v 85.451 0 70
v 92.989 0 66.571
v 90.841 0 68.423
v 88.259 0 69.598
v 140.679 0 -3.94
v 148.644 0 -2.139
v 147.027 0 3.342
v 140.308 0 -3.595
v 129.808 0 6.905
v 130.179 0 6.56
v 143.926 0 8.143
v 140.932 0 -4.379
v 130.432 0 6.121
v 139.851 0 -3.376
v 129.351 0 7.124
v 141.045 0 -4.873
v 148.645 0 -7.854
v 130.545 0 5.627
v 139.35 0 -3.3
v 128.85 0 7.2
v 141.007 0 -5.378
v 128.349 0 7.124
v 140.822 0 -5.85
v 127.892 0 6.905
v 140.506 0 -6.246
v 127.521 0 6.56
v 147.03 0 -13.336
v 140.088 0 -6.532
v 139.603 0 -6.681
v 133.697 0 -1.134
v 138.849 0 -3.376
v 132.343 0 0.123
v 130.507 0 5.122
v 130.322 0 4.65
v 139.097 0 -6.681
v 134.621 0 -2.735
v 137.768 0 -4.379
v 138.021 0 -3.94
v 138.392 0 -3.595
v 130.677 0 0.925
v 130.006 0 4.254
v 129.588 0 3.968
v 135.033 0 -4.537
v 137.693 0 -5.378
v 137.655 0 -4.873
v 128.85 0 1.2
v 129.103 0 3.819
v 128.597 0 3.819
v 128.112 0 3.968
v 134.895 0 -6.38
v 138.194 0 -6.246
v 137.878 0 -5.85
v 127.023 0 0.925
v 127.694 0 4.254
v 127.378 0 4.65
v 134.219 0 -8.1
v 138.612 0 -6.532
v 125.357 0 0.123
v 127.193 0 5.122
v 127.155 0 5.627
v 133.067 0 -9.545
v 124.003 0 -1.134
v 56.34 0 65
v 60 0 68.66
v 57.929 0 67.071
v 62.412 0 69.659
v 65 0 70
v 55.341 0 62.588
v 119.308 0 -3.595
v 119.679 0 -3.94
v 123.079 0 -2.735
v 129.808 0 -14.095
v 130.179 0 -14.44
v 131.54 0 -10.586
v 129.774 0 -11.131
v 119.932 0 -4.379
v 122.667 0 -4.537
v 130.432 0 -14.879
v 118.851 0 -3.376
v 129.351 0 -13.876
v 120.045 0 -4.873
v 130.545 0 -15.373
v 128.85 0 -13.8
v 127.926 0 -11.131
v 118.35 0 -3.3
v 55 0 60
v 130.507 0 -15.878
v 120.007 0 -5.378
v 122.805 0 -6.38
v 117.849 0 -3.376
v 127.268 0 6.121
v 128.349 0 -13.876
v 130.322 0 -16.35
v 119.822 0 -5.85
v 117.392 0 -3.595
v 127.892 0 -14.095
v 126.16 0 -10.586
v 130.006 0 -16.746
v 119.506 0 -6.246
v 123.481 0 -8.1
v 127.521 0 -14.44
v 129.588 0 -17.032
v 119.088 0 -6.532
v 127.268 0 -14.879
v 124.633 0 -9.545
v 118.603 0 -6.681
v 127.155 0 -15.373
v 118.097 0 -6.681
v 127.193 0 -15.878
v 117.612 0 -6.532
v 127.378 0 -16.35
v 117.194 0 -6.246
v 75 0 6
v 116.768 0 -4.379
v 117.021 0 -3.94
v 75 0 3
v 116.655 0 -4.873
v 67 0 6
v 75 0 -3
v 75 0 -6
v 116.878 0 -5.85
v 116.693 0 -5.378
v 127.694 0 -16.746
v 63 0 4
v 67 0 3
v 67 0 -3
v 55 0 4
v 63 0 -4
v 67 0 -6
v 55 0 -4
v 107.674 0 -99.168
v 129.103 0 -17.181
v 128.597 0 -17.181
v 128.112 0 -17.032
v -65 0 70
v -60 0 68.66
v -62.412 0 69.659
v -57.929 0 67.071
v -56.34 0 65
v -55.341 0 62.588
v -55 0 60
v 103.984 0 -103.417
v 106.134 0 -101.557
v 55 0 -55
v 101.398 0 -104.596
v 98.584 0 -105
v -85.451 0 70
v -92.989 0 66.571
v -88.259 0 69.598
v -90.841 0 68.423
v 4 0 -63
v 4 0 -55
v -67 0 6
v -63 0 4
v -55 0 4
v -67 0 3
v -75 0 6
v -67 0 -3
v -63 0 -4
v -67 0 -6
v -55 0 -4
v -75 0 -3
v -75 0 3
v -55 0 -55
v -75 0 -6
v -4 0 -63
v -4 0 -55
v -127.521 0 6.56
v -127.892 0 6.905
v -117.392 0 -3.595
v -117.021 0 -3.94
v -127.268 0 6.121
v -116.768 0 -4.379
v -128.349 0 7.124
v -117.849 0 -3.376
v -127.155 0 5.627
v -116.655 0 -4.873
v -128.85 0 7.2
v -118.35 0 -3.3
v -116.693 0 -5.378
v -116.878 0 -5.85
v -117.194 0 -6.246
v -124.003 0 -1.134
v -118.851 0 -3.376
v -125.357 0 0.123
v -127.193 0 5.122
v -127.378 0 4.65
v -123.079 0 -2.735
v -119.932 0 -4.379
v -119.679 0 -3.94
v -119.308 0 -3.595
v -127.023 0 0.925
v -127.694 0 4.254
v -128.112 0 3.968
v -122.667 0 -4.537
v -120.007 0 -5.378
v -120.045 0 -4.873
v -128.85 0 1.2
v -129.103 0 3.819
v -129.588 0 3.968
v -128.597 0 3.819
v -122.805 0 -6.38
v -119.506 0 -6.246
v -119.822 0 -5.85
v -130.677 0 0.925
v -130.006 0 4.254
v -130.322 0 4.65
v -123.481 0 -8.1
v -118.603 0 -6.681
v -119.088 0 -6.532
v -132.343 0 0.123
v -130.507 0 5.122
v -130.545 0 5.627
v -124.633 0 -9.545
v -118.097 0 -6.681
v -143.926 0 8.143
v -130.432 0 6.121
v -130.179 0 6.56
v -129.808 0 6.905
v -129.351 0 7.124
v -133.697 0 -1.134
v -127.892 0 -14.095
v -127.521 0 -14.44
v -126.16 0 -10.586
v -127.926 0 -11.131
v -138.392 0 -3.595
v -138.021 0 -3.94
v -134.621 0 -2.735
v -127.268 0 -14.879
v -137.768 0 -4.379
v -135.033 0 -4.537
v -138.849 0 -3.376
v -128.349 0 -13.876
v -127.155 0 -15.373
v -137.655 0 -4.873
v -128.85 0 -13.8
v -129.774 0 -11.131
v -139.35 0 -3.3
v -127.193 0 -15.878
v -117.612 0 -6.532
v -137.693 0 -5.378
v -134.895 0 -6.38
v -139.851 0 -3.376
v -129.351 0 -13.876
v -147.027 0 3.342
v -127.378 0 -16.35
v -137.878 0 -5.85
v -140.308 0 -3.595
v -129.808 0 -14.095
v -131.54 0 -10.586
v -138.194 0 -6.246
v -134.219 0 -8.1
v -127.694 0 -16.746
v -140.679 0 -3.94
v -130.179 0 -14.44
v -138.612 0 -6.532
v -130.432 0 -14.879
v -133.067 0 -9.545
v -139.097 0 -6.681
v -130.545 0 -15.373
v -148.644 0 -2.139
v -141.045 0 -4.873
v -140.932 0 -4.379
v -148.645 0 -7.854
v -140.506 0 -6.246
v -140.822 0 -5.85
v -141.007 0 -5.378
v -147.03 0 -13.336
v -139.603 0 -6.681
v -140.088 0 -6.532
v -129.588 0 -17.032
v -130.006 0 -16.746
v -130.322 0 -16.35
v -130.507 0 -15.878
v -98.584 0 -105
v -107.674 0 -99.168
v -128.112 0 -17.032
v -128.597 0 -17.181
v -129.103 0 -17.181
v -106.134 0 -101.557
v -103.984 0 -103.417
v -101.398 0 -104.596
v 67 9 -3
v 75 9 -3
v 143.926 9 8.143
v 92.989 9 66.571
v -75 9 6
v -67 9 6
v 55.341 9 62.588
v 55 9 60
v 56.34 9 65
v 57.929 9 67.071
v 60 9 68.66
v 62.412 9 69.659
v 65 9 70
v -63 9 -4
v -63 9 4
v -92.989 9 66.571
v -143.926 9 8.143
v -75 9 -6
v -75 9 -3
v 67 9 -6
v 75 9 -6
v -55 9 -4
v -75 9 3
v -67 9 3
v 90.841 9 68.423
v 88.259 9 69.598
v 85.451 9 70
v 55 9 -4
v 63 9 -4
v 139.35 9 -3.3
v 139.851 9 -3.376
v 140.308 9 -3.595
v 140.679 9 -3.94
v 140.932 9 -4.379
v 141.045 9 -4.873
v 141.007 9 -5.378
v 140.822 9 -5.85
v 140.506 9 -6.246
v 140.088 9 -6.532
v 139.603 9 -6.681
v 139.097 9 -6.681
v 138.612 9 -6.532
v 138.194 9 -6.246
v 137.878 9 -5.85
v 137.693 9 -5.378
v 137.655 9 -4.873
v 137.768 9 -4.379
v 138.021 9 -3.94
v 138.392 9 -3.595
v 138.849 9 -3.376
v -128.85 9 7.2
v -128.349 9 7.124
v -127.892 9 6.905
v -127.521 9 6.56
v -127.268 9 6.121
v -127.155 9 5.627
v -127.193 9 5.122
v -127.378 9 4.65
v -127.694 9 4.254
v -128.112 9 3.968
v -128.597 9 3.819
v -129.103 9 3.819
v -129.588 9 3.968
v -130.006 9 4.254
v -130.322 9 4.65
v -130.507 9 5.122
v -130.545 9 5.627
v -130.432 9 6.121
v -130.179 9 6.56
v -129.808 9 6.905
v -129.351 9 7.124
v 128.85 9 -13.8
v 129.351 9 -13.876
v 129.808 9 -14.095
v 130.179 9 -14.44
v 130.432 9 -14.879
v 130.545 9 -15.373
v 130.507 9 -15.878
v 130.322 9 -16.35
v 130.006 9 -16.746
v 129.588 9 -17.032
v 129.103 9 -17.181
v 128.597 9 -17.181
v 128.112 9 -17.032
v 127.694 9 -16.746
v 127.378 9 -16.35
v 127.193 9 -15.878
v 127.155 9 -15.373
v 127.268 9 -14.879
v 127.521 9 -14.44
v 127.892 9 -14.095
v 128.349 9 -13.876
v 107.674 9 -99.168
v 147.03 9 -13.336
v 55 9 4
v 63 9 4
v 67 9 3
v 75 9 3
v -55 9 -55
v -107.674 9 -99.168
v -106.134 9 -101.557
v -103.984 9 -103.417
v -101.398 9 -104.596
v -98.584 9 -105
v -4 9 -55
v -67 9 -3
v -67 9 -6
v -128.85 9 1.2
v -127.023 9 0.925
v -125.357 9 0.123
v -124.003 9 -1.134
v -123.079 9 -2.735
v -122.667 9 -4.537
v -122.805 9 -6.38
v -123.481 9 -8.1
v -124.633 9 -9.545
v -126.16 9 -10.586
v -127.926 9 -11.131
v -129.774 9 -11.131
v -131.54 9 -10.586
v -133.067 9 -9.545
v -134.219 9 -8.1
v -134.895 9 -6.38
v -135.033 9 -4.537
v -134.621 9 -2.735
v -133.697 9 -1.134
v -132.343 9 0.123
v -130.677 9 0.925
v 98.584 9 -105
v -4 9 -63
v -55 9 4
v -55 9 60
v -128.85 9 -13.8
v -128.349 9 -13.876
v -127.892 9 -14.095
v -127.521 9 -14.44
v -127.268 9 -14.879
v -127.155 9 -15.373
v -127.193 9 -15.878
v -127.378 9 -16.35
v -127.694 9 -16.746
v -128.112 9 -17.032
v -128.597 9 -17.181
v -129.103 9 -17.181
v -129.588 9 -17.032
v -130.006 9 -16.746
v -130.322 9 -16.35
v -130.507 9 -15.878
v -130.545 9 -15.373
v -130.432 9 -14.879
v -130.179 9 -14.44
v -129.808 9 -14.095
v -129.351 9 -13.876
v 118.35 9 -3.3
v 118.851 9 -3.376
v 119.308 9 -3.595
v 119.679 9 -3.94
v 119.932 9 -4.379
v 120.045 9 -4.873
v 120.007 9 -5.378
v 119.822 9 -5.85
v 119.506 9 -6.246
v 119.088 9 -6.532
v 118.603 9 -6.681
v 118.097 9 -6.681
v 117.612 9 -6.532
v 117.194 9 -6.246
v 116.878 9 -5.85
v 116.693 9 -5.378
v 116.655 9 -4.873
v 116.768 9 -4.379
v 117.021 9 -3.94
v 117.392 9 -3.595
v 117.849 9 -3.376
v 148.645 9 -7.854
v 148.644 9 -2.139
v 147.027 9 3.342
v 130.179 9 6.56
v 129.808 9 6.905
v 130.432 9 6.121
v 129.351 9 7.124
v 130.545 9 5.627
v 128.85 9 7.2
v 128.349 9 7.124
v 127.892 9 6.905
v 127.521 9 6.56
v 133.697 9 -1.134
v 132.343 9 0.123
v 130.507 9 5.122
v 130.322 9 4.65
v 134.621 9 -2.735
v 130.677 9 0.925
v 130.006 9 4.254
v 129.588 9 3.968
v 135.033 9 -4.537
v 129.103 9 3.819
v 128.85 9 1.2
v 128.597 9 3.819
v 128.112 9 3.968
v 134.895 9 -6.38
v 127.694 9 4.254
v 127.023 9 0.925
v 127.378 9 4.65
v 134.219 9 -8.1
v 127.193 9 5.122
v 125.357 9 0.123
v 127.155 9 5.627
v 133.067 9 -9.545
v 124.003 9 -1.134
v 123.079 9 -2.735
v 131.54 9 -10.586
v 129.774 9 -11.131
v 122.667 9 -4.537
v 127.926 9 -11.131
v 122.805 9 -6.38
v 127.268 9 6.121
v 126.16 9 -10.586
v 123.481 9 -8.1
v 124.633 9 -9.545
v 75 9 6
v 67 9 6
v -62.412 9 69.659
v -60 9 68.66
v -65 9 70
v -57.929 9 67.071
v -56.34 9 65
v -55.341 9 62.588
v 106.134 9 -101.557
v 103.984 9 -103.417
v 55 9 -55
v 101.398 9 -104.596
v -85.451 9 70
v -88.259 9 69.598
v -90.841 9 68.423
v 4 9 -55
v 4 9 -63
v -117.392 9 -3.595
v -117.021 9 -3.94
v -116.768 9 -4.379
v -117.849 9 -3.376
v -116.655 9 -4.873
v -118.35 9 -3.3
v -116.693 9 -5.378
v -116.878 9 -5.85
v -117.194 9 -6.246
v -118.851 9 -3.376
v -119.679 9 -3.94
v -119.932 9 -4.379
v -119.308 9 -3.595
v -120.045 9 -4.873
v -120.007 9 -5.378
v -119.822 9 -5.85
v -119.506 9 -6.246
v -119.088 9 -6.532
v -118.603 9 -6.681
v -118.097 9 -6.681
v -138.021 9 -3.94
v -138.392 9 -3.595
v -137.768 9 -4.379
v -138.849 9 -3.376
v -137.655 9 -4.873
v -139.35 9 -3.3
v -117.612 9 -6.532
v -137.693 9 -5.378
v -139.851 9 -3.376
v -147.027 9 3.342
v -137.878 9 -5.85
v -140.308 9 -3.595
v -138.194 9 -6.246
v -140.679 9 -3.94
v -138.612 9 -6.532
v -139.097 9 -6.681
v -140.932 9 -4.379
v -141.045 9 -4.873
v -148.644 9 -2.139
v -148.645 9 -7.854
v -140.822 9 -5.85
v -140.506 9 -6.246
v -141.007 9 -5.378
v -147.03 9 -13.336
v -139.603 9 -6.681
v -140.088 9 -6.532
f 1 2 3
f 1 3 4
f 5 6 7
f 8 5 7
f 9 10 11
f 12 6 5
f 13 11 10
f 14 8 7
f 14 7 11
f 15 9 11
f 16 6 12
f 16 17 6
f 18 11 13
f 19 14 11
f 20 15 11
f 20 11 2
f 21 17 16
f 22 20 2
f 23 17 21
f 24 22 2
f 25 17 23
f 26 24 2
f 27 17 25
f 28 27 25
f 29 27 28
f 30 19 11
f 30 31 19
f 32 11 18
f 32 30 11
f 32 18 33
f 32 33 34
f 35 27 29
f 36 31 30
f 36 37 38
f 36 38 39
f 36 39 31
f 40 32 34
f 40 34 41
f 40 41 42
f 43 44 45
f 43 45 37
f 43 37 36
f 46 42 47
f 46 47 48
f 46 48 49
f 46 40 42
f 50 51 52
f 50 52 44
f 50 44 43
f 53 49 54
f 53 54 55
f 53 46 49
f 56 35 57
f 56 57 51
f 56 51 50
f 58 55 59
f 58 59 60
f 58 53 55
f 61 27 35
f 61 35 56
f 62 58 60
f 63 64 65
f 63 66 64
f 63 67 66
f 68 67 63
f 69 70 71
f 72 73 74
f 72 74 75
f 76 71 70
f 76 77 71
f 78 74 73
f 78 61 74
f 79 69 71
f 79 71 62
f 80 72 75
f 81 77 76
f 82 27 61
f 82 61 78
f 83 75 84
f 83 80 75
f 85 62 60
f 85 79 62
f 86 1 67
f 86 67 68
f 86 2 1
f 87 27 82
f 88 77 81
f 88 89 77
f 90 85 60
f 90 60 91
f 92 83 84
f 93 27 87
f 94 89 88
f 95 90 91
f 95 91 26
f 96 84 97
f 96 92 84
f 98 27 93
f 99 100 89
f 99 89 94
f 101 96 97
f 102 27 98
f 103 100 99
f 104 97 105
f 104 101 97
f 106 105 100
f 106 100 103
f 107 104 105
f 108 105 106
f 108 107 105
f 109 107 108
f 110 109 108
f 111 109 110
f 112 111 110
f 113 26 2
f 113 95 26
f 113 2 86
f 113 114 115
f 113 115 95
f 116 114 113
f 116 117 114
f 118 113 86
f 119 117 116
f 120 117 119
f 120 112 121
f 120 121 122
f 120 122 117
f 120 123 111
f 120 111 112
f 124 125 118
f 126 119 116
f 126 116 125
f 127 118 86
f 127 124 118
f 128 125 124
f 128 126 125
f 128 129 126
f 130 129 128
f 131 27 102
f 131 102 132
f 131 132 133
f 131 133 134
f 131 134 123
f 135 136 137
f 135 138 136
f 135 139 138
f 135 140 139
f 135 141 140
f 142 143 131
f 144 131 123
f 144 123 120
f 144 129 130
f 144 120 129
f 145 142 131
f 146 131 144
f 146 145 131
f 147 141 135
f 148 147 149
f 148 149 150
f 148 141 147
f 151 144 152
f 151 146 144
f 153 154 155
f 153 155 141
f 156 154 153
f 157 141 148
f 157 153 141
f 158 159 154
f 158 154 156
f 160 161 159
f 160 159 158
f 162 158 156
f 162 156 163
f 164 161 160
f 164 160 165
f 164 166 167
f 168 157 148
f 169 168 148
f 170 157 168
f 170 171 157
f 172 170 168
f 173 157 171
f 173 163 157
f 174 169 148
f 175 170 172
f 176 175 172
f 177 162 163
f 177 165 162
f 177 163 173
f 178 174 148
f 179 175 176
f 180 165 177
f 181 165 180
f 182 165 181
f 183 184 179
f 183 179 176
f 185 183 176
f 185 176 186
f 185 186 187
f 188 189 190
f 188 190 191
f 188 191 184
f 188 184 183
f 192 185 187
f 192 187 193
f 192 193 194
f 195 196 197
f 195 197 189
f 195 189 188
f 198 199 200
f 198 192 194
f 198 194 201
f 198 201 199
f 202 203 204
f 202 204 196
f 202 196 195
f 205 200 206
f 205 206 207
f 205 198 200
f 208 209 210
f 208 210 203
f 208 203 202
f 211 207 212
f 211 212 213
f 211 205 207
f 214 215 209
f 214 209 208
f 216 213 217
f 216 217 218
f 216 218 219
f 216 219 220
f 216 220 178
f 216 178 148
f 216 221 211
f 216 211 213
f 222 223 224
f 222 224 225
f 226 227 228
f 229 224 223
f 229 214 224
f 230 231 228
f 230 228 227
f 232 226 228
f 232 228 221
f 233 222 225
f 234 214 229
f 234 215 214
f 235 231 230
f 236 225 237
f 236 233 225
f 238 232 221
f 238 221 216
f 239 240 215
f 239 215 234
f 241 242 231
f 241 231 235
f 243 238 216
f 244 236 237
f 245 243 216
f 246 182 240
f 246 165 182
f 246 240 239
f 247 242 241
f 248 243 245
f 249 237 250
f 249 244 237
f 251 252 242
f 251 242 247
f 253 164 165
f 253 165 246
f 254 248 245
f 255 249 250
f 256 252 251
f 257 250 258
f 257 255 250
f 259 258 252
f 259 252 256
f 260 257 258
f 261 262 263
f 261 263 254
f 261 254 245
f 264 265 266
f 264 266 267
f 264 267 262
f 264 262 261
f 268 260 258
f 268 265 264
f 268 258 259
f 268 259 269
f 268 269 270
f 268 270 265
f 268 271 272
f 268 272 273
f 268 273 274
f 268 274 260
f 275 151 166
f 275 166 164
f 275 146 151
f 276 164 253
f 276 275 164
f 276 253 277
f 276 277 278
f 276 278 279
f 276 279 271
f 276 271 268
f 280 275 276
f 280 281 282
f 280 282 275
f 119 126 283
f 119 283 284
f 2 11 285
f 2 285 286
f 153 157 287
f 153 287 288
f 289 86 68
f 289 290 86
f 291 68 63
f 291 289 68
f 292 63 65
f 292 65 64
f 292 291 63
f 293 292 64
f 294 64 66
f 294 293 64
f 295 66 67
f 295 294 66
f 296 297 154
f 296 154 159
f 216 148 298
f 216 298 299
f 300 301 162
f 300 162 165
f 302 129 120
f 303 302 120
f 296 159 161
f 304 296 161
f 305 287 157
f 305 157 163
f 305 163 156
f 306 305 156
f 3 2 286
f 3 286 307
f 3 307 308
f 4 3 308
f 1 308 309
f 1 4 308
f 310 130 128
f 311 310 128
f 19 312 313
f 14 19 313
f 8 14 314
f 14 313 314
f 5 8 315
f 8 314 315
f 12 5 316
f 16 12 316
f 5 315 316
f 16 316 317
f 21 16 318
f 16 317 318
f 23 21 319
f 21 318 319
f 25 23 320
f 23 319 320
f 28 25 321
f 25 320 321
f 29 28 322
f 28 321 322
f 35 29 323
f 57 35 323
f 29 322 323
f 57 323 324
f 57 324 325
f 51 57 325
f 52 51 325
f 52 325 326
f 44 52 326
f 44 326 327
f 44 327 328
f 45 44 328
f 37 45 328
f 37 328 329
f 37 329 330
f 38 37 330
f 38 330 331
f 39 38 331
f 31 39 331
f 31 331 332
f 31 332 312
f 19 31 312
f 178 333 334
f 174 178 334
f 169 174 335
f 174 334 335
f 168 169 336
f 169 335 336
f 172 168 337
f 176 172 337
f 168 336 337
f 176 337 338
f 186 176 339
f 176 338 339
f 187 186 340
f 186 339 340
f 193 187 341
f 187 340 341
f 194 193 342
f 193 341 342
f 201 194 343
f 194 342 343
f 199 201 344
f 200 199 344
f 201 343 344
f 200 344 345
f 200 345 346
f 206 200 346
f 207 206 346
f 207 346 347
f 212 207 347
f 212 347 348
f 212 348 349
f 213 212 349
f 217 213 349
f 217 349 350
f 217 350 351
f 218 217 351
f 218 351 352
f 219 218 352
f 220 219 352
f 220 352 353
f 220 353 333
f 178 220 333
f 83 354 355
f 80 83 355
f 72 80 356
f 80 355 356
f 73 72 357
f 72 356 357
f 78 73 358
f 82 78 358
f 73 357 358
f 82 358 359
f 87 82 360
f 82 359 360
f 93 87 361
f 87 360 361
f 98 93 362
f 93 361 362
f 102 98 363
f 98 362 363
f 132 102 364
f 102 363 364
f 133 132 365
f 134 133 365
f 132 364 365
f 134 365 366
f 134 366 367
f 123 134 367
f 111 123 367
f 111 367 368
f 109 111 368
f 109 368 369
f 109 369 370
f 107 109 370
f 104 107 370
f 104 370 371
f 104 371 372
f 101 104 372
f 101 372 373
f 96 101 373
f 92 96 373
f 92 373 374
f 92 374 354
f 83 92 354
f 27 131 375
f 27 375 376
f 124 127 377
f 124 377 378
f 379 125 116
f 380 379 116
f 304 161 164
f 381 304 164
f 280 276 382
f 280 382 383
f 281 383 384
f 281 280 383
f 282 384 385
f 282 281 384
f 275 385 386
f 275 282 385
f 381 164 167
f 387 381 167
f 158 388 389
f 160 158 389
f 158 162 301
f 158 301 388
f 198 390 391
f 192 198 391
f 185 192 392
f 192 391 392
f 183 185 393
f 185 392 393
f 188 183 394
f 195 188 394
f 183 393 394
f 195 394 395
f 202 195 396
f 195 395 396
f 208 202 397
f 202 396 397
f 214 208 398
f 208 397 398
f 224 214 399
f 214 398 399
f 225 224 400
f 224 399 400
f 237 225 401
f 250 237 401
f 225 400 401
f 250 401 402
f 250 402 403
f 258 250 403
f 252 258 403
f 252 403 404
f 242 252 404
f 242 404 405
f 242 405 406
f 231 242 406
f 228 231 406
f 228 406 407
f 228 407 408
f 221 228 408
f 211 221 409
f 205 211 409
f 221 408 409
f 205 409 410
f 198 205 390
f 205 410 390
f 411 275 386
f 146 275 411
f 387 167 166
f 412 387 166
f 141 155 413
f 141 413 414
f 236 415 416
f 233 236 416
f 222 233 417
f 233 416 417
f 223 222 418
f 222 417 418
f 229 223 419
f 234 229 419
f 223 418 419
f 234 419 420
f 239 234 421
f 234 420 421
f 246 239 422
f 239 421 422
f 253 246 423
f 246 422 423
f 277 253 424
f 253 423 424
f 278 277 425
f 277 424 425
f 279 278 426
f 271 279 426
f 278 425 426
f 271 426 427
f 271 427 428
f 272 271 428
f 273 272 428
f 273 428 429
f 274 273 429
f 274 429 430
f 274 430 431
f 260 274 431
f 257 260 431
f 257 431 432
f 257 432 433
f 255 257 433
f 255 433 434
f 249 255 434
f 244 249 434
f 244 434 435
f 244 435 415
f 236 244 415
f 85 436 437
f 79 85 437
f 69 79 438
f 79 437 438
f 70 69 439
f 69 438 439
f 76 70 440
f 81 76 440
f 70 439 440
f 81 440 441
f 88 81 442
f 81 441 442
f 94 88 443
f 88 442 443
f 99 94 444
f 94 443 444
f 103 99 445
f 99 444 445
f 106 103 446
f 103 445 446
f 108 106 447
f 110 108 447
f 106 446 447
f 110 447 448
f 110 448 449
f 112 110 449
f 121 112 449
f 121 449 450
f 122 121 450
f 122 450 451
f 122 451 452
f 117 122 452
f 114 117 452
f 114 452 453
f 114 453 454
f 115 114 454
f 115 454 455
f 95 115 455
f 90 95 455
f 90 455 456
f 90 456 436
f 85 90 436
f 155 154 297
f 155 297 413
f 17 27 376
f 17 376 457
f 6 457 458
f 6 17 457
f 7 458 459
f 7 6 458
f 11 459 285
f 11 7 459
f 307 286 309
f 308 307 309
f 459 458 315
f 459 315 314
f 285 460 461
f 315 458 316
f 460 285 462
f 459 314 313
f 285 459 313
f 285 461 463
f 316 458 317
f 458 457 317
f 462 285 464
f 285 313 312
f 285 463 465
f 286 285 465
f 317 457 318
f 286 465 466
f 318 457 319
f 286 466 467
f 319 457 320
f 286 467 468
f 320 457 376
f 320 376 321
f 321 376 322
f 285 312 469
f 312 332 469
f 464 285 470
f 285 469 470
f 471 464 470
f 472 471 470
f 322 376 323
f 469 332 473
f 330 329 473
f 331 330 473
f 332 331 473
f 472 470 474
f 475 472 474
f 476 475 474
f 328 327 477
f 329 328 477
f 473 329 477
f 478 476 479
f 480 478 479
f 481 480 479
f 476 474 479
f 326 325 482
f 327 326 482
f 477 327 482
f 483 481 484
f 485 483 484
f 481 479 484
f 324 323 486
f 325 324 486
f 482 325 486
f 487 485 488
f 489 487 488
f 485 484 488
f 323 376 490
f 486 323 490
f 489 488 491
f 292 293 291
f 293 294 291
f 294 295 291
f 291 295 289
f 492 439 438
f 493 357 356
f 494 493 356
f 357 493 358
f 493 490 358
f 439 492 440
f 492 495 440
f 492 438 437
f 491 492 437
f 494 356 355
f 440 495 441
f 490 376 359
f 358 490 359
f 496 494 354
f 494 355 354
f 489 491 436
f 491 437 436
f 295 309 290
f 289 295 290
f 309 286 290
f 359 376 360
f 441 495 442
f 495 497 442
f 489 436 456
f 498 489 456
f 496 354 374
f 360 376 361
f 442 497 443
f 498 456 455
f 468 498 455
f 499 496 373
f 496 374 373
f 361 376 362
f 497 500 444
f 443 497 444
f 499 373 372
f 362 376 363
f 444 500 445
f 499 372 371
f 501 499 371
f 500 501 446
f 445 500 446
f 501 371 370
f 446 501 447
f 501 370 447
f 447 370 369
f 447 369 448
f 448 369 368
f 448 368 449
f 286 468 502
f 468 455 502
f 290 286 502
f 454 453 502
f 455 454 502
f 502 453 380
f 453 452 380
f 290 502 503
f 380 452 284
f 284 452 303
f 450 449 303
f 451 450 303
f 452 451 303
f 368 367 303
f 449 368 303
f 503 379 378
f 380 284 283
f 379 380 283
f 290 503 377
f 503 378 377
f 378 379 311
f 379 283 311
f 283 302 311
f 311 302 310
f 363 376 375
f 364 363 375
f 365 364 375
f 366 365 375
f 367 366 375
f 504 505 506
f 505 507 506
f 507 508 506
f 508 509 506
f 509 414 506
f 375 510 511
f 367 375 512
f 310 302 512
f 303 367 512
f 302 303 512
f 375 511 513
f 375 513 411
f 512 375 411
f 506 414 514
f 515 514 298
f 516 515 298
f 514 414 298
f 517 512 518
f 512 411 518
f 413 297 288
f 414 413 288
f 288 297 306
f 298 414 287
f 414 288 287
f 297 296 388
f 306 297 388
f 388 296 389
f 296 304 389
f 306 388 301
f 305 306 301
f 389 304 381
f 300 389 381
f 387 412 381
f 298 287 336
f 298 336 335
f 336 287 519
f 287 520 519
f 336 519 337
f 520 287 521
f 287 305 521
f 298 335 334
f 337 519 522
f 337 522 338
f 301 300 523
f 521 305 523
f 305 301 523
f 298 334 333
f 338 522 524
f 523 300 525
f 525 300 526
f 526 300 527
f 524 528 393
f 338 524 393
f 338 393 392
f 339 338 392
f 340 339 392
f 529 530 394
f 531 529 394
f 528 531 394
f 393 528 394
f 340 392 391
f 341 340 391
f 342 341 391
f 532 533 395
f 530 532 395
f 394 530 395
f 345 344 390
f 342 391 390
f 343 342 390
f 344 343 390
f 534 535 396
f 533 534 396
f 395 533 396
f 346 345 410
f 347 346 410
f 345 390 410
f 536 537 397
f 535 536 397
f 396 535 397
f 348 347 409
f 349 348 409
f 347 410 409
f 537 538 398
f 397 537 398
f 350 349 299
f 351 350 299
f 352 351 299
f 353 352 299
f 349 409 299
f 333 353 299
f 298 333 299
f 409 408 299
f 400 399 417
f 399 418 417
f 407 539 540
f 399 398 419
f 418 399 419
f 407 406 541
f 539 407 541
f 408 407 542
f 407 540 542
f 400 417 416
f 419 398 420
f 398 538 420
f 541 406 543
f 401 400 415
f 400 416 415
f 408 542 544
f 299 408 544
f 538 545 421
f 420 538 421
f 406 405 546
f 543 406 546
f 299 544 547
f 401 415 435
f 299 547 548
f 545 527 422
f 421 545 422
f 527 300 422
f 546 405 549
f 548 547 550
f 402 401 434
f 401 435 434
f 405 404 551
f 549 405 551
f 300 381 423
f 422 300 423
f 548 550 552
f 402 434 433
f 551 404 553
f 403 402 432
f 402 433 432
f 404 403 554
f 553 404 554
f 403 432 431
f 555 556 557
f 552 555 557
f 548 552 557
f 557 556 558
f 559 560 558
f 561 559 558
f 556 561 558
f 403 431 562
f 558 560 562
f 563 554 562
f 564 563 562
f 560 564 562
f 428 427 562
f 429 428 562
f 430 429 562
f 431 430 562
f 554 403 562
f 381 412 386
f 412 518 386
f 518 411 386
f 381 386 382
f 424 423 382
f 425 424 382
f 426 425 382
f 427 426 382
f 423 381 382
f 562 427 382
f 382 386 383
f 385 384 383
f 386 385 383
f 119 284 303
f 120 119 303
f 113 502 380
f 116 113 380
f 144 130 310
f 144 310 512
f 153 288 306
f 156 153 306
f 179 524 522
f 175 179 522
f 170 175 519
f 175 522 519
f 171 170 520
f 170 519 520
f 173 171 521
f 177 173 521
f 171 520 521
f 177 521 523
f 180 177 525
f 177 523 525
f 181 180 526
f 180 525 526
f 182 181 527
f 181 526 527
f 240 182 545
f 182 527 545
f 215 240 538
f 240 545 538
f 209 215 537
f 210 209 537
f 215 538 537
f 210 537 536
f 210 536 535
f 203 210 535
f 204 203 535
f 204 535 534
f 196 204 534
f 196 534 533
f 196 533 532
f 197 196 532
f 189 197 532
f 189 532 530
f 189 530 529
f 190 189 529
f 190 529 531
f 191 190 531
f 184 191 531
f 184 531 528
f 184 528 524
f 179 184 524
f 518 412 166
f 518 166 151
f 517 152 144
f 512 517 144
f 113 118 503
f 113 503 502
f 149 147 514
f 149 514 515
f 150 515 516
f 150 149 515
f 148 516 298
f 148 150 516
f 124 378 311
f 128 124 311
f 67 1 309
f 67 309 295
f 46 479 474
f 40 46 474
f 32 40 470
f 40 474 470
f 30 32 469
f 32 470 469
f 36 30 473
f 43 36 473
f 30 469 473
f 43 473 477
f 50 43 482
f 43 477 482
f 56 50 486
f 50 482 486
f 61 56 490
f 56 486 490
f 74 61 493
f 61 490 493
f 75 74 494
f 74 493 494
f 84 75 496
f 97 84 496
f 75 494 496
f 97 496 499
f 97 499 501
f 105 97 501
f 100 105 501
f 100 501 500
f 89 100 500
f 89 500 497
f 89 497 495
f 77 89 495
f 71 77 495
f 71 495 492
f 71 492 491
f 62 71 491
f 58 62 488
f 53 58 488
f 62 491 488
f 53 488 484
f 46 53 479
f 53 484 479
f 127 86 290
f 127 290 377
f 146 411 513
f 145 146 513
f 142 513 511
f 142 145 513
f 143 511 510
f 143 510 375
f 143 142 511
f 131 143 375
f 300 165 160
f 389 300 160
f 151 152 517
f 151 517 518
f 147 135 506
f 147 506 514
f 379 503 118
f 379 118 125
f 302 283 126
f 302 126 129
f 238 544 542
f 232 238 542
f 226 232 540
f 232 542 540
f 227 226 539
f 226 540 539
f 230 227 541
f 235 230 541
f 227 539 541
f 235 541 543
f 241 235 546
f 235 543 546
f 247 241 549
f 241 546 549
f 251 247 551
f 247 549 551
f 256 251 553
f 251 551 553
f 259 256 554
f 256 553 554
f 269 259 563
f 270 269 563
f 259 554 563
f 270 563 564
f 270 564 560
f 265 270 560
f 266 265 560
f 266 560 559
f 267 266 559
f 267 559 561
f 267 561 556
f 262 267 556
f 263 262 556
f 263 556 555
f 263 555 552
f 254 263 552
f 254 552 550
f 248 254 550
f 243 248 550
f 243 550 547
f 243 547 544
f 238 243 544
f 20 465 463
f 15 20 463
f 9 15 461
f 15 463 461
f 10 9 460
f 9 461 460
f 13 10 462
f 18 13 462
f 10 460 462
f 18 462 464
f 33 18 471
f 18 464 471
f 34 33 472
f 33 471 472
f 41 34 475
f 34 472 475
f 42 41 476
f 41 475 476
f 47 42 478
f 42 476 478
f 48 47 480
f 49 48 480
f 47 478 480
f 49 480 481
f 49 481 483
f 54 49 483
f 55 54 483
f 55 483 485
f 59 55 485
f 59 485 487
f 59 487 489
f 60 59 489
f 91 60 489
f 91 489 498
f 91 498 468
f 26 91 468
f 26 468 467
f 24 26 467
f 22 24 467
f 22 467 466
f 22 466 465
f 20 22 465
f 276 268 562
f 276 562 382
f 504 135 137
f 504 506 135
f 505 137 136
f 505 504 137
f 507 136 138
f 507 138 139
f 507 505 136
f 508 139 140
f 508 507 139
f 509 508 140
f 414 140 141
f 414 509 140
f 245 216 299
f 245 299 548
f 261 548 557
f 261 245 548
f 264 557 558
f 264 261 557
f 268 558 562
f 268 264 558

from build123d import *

# Parameters (mm, degrees)
SKETCH_1_W          = 110
SKETCH_1_H          = 110
EXTRUDE_1_DEPTH     = 9
SKETCH_2_R          = 6.2
CUT_EXTRUDE_1_DEPTH = 9
SKETCH_10_W         = 8
SKETCH_10_H         = 8
CUT_EXTRUDE_3_DEPTH = 10
SKETCH_9_W          = 110
SKETCH_9_H          = 15
CUT_EXTRUDE_4_DEPTH = 10
FILLET_1_R          = 10
SKETCH_11_W         = 8
SKETCH_11_H         = 3
CUT_EXTRUDE_5_DEPTH = 10
SKETCH_12_R         = 1.7
CUT_EXTRUDE_6_DEPTH = 10


with BuildPart() as part:
    # 草图1 → 凸台-拉伸1 (new body)
    with BuildSketch(Plane(origin=(0, 0, 0), x_dir=(1, 0, 0), z_dir=(0, 1, 0))):
        with BuildLine():
            Line((-98.584118364, 105), (98.584118364, 105))
            ThreePointArc((98.584118364, 105), (103.984134744, 103.416639656), (107.674116766, 99.167964619))
            Line((107.674116766, 99.167964619), (147.029996803, 13.335929237))
            ThreePointArc((147.029996803, 13.335929237), (148.644315385, 2.139042389), (143.925625878, -8.142507538))
            Line((143.925625878, -8.142507538), (92.989084735, -66.571253769))
            ThreePointArc((92.989084735, -66.571253769), (89.591770698, -69.102541889), (85.451271796, -70))
            Line((85.451271796, -70), (50, -70))
            Line((50, -70), (-55, -70))
            Line((-55, -70), (-85.451271796, -70))
            ThreePointArc((-85.451271796, -70), (-89.591770698, -69.102541889), (-92.989084735, -66.571253769))
            Line((-92.989084735, -66.571253769), (-143.925625878, -8.142507538))
            ThreePointArc((-143.925625878, -8.142507538), (-148.644315385, 2.139042389), (-147.029996803, 13.335929237))
            Line((-147.029996803, 13.335929237), (-107.674116766, 99.167964619))
            ThreePointArc((-107.674116766, 99.167964619), (-103.984134744, 103.416639656), (-98.584118364, 105))
        make_face()
        Rectangle(SKETCH_1_W, SKETCH_1_H, mode=Mode.SUBTRACT)
    extrude(amount=EXTRUDE_1_DEPTH)

    # 草图2 → 切除-拉伸1 (cut)
    with BuildSketch(Plane(origin=(0, 9, 0), x_dir=(1, 0, 0), z_dir=(0, 1, 0))):
        with Locations(Location((-128.85, 5, 0), (0, 0, 270))):
            Circle(SKETCH_2_R)
        with Locations(Location((128.85, 5, 0), (0, 0, 270))):
            Circle(SKETCH_2_R)
    extrude(amount=-CUT_EXTRUDE_1_DEPTH, mode=Mode.SUBTRACT)

    # 草图10 → 切除-拉伸3 (cut)
    with BuildSketch(Plane(origin=(0, 9, 0), x_dir=(1, 0, 0), z_dir=(0, 1, 0))):
        with Locations((-59, 0)):
            Rectangle(SKETCH_10_W, SKETCH_10_H)
        with Locations((0, 59)):
            Rectangle(SKETCH_10_W, SKETCH_10_H)
        with Locations((59, 0)):
            Rectangle(SKETCH_10_W, SKETCH_10_H)
        with Locations((0, -59)):
            Rectangle(SKETCH_10_W, SKETCH_10_H)
    extrude(amount=-CUT_EXTRUDE_3_DEPTH, mode=Mode.SUBTRACT)

    # 草图9 → 切除-拉伸4 (cut)
    with BuildSketch(Plane.XZ):
        with Locations((0, 62.5)):
            Rectangle(SKETCH_9_W, SKETCH_9_H)
    extrude(amount=-CUT_EXTRUDE_4_DEPTH, mode=Mode.SUBTRACT)

    # 圆角1
    fillet_1_edges = [part.edges().sort_by_distance(p)[0] for p in [
        (55, 4.5, 70),
        (-55, 4.5, 70),
    ]]
    fillet(fillet_1_edges, radius=FILLET_1_R)

    # 草图11 → 切除-拉伸5 (cut)
    with BuildSketch(Plane(origin=(0, 9, 0), x_dir=(1, 0, 0), z_dir=(0, 1, 0))):
        with Locations((71, 4.5)):
            Rectangle(SKETCH_11_W, SKETCH_11_H)
        with Locations((71, -4.5)):
            Rectangle(SKETCH_11_W, SKETCH_11_H)
        with Locations((-71, 4.5)):
            Rectangle(SKETCH_11_W, SKETCH_11_H)
        with Locations((-71, -4.5)):
            Rectangle(SKETCH_11_W, SKETCH_11_H)
    extrude(amount=-CUT_EXTRUDE_5_DEPTH, mode=Mode.SUBTRACT)

    # 草图12 → 切除-拉伸6 (cut)
    with BuildSketch(Plane(origin=(0, 9, 0), x_dir=(1, 0, 0), z_dir=(0, 1, 0))):
        with Locations(Location((-128.85, 15.5, 0), (0, 0, 270))):
            Circle(SKETCH_12_R)
        with Locations(Location((-118.35, 5, 0), (0, 0, 270))):
            Circle(SKETCH_12_R)
        with Locations(Location((-128.85, -5.5, 0), (0, 0, 270))):
            Circle(SKETCH_12_R)
        with Locations(Location((-139.35, 5, 0), (0, 0, 270))):
            Circle(SKETCH_12_R)
        with Locations(Location((139.35, 5, 0), (0, 0, 270))):
            Circle(SKETCH_12_R)
        with Locations(Location((128.85, -5.5, 0), (0, 0, 270))):
            Circle(SKETCH_12_R)
        with Locations(Location((118.35, 5, 0), (0, 0, 270))):
            Circle(SKETCH_12_R)
        with Locations(Location((128.85, 15.5, 0), (0, 0, 270))):
            Circle(SKETCH_12_R)
    extrude(amount=-CUT_EXTRUDE_6_DEPTH, mode=Mode.SUBTRACT)


solid = part.part
